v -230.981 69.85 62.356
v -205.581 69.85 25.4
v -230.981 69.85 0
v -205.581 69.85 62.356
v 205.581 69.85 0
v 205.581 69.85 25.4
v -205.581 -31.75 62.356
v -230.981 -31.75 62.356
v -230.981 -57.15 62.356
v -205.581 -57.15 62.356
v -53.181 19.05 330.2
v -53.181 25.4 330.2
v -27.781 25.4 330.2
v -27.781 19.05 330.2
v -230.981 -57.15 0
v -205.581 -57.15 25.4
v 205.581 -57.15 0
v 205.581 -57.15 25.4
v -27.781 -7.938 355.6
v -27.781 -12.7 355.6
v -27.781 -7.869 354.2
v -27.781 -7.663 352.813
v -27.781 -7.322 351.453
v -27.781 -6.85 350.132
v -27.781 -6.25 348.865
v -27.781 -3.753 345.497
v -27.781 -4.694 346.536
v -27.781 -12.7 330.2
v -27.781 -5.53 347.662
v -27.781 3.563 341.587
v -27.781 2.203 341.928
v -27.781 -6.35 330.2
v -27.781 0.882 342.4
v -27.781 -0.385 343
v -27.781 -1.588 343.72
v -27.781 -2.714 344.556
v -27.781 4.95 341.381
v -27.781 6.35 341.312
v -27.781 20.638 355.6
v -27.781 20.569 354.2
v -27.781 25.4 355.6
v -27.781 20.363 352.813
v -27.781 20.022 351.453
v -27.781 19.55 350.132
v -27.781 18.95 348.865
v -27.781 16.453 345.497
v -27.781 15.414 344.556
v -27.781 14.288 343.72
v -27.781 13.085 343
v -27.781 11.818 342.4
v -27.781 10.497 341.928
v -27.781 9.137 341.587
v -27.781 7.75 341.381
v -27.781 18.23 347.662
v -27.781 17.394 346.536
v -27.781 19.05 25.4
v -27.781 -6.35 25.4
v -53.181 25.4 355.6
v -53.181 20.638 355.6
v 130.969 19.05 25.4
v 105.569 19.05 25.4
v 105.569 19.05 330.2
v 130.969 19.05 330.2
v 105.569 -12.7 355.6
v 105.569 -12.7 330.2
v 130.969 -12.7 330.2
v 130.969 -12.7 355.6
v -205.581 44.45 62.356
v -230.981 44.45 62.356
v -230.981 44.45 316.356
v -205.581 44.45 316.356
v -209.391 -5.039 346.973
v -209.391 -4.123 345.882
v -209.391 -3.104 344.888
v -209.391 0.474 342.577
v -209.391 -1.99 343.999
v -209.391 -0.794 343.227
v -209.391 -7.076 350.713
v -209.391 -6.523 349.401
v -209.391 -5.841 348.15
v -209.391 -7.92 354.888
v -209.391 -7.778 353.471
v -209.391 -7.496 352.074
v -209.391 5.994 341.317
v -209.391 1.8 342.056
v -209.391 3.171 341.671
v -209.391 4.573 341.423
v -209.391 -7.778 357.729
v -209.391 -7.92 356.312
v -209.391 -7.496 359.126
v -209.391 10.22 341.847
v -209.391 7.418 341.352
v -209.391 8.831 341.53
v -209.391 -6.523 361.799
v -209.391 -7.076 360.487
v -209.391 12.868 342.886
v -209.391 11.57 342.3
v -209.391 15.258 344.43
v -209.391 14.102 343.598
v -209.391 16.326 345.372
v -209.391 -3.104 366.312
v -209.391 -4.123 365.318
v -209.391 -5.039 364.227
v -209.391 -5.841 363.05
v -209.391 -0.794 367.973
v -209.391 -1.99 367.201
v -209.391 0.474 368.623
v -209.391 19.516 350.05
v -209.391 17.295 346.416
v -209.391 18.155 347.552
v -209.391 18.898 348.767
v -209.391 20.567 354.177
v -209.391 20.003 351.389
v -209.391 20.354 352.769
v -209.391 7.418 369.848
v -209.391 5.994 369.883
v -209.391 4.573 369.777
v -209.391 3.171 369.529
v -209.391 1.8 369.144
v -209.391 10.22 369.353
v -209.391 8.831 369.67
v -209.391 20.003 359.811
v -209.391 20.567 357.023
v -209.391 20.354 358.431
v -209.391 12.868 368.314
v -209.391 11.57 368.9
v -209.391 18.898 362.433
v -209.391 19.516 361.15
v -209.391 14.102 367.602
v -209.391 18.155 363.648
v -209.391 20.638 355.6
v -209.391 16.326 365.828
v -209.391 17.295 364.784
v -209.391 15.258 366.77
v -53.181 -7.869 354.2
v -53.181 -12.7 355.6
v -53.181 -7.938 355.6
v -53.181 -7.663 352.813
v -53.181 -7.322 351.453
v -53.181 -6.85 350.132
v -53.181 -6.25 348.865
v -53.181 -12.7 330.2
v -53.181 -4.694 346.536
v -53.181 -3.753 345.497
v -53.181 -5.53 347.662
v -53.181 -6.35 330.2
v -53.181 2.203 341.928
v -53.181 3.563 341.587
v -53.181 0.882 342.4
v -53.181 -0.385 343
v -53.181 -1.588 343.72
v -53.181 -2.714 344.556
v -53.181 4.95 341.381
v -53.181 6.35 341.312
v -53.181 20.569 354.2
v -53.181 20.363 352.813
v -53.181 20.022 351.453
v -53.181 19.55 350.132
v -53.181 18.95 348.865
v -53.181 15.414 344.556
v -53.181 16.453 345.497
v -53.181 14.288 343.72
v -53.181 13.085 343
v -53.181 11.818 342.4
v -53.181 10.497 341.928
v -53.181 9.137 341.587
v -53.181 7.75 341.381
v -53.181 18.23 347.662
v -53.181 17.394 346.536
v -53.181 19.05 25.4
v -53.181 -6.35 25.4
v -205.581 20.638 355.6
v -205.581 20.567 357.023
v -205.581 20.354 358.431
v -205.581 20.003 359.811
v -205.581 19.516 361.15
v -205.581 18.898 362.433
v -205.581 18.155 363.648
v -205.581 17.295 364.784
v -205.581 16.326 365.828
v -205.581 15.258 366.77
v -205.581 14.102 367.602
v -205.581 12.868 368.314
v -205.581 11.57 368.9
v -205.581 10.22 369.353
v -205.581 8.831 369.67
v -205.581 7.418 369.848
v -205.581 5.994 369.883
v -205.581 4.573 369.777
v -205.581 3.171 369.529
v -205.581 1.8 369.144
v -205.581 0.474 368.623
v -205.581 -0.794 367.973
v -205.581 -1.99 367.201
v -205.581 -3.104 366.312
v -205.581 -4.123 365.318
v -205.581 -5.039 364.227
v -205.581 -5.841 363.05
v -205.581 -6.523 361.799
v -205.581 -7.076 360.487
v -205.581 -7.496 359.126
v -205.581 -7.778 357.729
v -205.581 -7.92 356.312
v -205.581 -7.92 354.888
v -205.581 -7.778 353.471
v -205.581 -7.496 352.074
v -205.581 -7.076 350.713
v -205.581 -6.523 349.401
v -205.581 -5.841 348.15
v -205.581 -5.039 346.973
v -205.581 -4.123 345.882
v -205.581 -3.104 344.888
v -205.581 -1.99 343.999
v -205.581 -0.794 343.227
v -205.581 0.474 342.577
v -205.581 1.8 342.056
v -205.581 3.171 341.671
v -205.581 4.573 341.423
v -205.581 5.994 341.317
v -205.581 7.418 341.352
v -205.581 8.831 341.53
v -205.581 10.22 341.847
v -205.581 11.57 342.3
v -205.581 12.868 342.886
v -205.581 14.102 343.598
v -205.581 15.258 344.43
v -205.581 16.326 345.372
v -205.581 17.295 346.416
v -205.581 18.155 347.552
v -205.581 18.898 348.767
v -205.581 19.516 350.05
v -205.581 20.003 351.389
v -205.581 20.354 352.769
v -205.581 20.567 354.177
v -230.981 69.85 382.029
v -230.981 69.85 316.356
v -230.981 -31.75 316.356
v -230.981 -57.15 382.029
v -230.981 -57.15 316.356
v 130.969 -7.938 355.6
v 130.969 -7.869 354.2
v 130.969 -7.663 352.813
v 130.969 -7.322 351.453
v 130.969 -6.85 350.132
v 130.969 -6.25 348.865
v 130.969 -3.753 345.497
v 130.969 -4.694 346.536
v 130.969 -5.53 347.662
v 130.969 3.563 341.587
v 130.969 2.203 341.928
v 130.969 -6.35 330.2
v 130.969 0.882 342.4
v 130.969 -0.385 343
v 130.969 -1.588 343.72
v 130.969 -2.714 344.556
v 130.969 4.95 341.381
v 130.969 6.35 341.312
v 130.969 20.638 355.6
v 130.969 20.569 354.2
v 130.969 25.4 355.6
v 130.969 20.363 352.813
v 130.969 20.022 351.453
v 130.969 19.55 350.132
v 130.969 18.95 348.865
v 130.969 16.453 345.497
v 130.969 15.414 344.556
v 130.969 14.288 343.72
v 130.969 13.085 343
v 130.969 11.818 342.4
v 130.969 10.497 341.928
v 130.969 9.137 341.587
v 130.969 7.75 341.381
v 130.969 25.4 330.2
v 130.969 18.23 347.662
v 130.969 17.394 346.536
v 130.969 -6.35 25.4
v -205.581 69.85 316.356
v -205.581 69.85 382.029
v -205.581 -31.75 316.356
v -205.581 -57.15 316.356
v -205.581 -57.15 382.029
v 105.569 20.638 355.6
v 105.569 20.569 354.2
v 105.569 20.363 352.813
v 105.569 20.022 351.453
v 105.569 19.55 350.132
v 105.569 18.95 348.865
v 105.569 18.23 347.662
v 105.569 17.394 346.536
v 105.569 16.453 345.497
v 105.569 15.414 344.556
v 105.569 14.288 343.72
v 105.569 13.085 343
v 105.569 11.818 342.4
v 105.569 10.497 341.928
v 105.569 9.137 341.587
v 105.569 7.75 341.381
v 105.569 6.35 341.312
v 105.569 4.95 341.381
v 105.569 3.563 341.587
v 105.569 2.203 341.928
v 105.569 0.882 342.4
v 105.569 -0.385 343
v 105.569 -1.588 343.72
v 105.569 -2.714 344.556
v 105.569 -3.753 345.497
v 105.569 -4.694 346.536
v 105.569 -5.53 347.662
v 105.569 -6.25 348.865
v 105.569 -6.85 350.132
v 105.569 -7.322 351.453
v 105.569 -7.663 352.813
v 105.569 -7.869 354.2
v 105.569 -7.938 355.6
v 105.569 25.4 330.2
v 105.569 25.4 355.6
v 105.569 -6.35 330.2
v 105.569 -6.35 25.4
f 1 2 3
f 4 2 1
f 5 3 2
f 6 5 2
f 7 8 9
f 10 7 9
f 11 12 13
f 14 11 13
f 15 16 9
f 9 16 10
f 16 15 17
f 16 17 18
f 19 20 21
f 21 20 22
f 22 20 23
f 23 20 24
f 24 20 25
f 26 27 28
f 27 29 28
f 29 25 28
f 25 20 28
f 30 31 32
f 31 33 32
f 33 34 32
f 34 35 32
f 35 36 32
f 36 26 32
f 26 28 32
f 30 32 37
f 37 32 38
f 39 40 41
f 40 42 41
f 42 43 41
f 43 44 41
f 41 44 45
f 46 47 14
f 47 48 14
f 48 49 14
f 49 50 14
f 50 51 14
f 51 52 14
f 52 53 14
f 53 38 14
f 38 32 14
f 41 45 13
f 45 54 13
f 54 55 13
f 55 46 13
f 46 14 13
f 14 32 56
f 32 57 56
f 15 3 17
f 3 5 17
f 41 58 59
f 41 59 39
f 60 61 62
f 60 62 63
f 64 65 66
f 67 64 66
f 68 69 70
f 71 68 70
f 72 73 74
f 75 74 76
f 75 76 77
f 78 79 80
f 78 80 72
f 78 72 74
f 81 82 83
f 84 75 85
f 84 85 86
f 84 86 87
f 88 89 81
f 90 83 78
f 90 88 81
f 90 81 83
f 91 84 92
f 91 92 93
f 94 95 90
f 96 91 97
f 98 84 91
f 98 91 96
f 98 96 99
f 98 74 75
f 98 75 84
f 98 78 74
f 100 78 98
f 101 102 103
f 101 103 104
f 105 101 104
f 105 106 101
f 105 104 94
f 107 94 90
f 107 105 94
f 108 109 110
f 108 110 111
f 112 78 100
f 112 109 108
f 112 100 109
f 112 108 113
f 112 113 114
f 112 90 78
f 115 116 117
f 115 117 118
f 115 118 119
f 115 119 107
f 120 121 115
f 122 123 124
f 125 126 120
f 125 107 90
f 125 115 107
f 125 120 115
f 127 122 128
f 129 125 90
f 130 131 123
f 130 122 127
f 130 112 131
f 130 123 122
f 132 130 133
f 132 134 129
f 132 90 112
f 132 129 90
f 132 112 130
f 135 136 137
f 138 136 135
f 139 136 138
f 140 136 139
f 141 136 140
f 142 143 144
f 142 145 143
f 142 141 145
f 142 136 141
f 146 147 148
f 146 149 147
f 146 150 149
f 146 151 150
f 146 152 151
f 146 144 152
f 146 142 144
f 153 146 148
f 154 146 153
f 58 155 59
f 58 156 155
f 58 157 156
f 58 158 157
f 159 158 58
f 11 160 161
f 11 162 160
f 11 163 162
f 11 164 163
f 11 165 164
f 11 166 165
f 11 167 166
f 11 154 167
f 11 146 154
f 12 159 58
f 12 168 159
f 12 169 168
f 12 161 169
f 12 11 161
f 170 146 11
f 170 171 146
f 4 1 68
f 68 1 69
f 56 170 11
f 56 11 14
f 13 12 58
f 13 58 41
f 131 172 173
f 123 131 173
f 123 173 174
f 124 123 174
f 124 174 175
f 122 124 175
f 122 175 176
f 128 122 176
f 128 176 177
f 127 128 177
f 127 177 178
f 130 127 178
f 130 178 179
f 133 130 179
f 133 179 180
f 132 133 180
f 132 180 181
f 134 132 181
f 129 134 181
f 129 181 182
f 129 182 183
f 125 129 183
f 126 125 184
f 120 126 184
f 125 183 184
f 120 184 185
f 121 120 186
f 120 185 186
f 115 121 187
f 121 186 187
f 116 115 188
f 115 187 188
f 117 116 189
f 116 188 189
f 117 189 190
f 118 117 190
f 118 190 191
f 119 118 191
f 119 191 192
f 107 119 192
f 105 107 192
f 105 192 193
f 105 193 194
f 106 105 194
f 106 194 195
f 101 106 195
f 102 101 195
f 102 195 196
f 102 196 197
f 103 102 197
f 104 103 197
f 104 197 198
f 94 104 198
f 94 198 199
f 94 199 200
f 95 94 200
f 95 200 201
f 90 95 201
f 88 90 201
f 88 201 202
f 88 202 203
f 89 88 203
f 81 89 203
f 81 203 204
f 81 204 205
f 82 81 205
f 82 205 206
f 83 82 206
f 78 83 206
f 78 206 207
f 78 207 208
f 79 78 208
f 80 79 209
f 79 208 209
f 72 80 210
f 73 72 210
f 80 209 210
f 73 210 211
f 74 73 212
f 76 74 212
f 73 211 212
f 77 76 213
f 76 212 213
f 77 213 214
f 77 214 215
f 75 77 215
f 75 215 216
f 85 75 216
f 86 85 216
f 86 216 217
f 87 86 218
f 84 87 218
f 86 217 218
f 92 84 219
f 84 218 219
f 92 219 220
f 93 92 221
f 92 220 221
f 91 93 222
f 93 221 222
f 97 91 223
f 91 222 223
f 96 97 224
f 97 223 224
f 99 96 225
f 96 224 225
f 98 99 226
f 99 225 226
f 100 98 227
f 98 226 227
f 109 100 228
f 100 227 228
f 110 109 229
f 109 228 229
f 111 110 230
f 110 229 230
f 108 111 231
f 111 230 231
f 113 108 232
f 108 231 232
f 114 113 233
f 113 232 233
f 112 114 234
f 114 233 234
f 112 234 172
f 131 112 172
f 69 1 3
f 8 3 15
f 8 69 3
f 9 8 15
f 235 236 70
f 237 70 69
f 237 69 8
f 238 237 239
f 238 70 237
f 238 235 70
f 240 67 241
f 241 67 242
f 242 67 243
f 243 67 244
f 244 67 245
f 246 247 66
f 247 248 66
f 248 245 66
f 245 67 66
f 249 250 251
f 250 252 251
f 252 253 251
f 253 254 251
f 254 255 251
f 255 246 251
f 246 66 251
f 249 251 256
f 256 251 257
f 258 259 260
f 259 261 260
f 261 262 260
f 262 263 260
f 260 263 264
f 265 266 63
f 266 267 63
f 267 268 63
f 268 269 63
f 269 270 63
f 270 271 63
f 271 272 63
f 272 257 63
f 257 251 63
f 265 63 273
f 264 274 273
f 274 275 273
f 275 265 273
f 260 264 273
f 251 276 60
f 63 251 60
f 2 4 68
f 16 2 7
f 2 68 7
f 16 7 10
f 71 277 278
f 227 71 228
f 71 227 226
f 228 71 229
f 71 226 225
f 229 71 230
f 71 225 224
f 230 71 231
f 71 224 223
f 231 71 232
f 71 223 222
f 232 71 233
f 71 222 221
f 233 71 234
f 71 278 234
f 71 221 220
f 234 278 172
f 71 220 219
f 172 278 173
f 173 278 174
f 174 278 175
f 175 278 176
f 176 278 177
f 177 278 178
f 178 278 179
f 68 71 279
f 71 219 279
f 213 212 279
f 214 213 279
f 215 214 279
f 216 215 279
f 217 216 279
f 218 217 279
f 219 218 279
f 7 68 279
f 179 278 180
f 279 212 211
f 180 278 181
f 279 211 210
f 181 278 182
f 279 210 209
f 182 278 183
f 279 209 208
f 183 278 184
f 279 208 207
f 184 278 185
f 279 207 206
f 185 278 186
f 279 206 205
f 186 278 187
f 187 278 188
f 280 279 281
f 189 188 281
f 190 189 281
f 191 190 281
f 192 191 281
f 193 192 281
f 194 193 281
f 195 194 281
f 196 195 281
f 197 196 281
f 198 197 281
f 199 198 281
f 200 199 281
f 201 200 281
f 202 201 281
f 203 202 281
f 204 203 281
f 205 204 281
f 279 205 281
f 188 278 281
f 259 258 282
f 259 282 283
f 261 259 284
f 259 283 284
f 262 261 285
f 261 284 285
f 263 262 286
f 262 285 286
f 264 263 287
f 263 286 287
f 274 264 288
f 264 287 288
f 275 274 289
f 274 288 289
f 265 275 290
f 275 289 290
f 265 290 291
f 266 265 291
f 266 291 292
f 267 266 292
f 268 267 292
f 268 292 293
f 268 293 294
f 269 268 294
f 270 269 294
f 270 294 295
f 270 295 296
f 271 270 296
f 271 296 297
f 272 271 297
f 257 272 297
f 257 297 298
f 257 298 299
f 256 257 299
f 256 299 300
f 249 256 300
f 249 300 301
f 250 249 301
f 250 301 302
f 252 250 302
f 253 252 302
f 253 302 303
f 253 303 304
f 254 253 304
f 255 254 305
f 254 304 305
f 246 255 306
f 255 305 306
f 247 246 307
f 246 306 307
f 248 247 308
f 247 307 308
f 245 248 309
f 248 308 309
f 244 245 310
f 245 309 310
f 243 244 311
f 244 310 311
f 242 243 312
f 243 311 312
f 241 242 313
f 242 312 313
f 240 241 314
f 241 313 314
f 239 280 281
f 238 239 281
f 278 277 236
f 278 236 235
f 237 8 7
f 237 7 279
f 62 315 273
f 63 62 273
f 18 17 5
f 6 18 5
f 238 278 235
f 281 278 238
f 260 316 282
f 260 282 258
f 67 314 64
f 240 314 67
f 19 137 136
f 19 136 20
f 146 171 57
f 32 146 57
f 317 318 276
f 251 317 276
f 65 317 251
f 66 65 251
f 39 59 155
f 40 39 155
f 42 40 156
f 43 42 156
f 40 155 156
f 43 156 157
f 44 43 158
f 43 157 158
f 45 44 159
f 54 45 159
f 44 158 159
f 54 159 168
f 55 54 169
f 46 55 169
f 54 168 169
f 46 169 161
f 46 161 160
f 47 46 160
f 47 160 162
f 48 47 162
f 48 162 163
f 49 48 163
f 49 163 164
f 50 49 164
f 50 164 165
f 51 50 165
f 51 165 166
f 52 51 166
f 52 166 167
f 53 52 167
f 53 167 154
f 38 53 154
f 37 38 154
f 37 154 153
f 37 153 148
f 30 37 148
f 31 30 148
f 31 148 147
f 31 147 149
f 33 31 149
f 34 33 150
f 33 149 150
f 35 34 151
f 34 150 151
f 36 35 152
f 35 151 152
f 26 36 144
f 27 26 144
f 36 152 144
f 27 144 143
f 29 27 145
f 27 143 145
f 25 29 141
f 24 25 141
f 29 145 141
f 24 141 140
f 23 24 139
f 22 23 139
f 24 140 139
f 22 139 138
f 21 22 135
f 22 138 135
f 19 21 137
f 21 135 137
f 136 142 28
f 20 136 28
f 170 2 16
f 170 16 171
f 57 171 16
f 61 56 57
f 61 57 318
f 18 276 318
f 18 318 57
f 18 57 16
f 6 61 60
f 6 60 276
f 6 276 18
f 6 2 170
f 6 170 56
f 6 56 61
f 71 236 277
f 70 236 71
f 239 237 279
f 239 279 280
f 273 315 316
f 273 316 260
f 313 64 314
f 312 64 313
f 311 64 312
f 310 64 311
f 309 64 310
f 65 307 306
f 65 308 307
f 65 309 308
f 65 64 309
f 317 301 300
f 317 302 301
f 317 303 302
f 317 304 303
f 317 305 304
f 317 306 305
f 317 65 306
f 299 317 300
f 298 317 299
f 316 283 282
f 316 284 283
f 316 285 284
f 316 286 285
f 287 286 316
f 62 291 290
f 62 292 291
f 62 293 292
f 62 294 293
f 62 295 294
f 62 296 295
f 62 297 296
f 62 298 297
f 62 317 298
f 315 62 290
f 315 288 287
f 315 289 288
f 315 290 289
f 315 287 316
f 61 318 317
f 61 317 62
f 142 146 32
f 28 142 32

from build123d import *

# Parameters (mm, degrees)
F0_W      = 411.1625
F0_H      = 127
F1_DEPTH  = 25.4
F2_W      = 25.4
F2_H      = 25.4
F3_DEPTH  = 304.8
F4_W      = 25.4
F4_H      = 38.1
F5_DEPTH  = 25.4
F7_DEPTH  = 258.7635
F8_W      = 127
F8_H      = 382.02858
F9_DEPTH  = 25.4
F10_W     = 89.525855
F10_H     = 254
F11_DEPTH = 25.4
F12_R     = 14.2875
F13_DEPTH = 340.36


with BuildPart() as f1:
    # F0 (on Top) → F1 (new body)
    with BuildSketch(Plane.XY):
        with Locations((0, 6.35)):
            Rectangle(F0_W, F0_H)
    extrude(amount=F1_DEPTH)

    # F2 (on face) → F3 (join)
    with BuildSketch(Plane.XY.offset(25.4)):
        with Locations((-40.48125, 6.35)):
            Rectangle(F2_W, F2_H)
        with Locations((118.26875, 6.35)):
            Rectangle(F2_W, F2_H)
    extrude(amount=F3_DEPTH)

    # F4 (on face) → F5 (join)
    with BuildSketch(Plane.XY.offset(330.2)):
        with Locations((-40.48125, 6.35)):
            Rectangle(F4_W, F4_H)
        with Locations((118.26875, 6.35)):
            Rectangle(F4_W, F4_H)
    extrude(amount=F5_DEPTH)

    # F6 (on face) → F7 (cut, through all)
    with BuildSketch(Plane(origin=(-53.18125, 0, 0), x_dir=(0, -1, 0), z_dir=(-1, 0, 0))):
        with BuildLine():
            Line((7.9375, 355.6), (-20.6375, 355.6))
            ThreePointArc((-20.6375, 355.6), (-6.35, 341.3125), (7.9375, 355.6))
        make_face()
    extrude(amount=-F7_DEPTH, mode=Mode.SUBTRACT)

    # F8 (on face) → F9 (join)
    with BuildSketch(Plane(origin=(-205.58125, 0, 0), x_dir=(0, -1, 0), z_dir=(-1, 0, 0))):
        with Locations((-6.35, 191.01429)):
            Rectangle(F8_W, F8_H)
    extrude(amount=F9_DEPTH)

    # F10 (on face) → F11 (cut)
    with BuildSketch(Plane(origin=(-230.98125, 0, 0), x_dir=(0, -1, 0), z_dir=(-1, 0, 0))):
        with Locations((-89.212927, 189.356351)):
            Rectangle(F10_W, F10_H)
        with Locations((76.512927, 189.356351)):
            Rectangle(F10_W, F10_H)
    extrude(amount=-F11_DEPTH, mode=Mode.SUBTRACT)

    # F12 (on face) → F13 (cut)
    with BuildSketch(Plane.YZ.offset(130.96875)):
        with Locations((6.35, 355.6)):
            Circle(F12_R)
    extrude(amount=-F13_DEPTH, mode=Mode.SUBTRACT)


solid = f1.part
